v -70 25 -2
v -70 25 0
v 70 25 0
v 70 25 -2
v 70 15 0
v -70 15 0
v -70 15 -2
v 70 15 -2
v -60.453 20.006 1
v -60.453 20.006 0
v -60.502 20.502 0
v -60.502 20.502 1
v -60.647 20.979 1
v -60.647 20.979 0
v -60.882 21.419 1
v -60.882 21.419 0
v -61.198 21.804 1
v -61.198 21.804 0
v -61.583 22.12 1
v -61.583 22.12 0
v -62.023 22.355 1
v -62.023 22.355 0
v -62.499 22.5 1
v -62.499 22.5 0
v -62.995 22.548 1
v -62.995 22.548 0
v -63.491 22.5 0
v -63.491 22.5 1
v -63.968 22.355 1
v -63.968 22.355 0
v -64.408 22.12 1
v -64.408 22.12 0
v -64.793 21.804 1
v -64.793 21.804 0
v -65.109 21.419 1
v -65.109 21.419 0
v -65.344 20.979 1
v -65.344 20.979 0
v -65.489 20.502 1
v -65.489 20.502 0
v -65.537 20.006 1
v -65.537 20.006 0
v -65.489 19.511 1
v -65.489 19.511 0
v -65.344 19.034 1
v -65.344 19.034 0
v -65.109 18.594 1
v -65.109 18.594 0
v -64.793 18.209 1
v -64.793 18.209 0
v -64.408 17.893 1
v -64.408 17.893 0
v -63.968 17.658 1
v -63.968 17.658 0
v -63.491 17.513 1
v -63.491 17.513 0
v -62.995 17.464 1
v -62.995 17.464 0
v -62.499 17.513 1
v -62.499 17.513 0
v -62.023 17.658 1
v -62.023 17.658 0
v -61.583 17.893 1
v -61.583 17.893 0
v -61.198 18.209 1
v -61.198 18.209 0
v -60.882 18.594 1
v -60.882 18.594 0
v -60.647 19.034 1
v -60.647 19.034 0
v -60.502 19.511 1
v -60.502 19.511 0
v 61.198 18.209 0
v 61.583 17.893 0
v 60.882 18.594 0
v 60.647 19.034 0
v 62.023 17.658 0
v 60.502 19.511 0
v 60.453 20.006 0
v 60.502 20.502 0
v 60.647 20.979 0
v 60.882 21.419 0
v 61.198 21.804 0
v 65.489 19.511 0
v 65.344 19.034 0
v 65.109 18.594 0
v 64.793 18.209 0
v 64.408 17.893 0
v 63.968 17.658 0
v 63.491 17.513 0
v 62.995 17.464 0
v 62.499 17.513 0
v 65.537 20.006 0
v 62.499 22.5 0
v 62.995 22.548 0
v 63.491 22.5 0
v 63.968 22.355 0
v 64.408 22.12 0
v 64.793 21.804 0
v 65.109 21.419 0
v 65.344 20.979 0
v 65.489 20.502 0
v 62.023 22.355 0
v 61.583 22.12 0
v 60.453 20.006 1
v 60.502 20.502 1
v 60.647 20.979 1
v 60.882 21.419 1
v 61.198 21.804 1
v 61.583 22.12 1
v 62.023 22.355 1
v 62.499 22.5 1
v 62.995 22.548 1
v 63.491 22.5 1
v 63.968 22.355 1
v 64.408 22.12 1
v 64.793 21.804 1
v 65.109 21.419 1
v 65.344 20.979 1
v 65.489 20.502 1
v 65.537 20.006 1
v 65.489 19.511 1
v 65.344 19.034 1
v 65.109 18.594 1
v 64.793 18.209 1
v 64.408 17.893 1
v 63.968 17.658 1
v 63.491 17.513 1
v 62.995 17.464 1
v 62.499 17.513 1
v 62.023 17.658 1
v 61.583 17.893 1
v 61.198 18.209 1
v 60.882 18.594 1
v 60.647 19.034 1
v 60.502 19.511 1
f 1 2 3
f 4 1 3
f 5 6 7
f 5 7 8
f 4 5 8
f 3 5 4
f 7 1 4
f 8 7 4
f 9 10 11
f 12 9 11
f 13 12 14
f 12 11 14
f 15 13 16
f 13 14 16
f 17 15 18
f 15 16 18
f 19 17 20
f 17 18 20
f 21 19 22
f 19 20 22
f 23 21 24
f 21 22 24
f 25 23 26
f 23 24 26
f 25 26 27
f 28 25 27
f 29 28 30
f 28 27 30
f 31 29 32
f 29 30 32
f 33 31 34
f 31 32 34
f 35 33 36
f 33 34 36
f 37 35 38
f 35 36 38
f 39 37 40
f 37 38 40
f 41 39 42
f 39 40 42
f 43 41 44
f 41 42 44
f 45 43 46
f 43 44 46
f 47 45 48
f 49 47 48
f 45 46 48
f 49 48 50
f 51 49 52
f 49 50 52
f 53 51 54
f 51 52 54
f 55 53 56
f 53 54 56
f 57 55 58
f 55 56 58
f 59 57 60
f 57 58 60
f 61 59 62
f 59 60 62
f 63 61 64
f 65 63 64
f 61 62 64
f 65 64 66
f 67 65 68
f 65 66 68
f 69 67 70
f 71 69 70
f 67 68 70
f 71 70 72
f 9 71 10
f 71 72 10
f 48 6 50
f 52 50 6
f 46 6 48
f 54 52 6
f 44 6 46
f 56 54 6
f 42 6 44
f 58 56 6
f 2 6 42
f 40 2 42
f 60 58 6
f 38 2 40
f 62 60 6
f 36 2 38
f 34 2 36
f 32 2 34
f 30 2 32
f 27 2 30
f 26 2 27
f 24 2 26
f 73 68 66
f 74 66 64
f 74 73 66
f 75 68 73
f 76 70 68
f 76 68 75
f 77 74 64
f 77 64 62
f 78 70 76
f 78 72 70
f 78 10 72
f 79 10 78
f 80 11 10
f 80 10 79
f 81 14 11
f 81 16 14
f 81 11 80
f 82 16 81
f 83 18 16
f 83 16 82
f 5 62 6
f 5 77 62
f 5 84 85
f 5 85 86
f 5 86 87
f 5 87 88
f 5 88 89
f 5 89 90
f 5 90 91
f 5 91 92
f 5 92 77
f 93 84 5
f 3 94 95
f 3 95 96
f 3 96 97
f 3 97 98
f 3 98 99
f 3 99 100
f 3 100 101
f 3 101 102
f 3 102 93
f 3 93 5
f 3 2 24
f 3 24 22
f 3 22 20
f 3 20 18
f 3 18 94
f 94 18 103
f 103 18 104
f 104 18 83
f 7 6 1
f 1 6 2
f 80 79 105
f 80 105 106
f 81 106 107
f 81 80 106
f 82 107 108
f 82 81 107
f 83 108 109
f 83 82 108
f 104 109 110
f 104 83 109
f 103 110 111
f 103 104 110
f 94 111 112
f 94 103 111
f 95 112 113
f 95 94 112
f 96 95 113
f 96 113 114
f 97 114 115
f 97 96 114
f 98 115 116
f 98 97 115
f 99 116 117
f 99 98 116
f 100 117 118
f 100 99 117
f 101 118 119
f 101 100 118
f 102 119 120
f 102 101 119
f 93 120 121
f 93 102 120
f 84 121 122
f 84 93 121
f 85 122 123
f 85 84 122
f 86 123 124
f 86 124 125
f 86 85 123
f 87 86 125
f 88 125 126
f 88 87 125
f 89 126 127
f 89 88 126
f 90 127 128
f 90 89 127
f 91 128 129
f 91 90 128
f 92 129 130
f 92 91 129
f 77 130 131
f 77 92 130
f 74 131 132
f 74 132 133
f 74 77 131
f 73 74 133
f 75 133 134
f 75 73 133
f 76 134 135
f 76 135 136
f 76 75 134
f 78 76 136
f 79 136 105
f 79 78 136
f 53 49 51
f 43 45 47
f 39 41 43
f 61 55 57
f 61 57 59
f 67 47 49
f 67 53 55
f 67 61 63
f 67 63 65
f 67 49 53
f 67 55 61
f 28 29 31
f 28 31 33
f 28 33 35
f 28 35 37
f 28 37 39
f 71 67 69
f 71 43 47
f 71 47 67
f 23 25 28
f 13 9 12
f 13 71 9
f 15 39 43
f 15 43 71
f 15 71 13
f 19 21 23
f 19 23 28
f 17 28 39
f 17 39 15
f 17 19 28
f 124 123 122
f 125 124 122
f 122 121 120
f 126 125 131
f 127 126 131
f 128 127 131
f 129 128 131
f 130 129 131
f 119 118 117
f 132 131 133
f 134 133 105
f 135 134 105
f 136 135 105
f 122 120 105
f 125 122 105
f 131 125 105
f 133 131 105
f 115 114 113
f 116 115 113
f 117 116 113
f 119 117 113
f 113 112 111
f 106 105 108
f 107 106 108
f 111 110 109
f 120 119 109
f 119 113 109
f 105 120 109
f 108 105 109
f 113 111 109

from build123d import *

# Parameters (mm, degrees)
SKETCH018_W  = 140
SKETCH018_H  = 10
PAD013_DEPTH = 2
SKETCH026_R  = 2.542055
PAD018_DEPTH = 1


with BuildPart() as part:
    # Sketch018 → Pad013 (new body)
    with BuildSketch(Plane.XY):
        with Locations((0, 20)):
            Rectangle(SKETCH018_W, SKETCH018_H)
    extrude(amount=-PAD013_DEPTH)

    # Sketch026 (on Face5 of Pad013) → Pad018 (join)
    with BuildSketch(Plane.XY):
        with Locations((-62.995332, 20.006431)):
            Circle(SKETCH026_R)
    pad018 = extrude(amount=PAD018_DEPTH)

    # Mirrored003: Pad018 across Sketch026 V_Axis
    add(pad018.mirror(Plane(origin=(0, 0, 0), x_dir=(0, 0, 1), z_dir=(1, 0, 0))))


solid = part.part
